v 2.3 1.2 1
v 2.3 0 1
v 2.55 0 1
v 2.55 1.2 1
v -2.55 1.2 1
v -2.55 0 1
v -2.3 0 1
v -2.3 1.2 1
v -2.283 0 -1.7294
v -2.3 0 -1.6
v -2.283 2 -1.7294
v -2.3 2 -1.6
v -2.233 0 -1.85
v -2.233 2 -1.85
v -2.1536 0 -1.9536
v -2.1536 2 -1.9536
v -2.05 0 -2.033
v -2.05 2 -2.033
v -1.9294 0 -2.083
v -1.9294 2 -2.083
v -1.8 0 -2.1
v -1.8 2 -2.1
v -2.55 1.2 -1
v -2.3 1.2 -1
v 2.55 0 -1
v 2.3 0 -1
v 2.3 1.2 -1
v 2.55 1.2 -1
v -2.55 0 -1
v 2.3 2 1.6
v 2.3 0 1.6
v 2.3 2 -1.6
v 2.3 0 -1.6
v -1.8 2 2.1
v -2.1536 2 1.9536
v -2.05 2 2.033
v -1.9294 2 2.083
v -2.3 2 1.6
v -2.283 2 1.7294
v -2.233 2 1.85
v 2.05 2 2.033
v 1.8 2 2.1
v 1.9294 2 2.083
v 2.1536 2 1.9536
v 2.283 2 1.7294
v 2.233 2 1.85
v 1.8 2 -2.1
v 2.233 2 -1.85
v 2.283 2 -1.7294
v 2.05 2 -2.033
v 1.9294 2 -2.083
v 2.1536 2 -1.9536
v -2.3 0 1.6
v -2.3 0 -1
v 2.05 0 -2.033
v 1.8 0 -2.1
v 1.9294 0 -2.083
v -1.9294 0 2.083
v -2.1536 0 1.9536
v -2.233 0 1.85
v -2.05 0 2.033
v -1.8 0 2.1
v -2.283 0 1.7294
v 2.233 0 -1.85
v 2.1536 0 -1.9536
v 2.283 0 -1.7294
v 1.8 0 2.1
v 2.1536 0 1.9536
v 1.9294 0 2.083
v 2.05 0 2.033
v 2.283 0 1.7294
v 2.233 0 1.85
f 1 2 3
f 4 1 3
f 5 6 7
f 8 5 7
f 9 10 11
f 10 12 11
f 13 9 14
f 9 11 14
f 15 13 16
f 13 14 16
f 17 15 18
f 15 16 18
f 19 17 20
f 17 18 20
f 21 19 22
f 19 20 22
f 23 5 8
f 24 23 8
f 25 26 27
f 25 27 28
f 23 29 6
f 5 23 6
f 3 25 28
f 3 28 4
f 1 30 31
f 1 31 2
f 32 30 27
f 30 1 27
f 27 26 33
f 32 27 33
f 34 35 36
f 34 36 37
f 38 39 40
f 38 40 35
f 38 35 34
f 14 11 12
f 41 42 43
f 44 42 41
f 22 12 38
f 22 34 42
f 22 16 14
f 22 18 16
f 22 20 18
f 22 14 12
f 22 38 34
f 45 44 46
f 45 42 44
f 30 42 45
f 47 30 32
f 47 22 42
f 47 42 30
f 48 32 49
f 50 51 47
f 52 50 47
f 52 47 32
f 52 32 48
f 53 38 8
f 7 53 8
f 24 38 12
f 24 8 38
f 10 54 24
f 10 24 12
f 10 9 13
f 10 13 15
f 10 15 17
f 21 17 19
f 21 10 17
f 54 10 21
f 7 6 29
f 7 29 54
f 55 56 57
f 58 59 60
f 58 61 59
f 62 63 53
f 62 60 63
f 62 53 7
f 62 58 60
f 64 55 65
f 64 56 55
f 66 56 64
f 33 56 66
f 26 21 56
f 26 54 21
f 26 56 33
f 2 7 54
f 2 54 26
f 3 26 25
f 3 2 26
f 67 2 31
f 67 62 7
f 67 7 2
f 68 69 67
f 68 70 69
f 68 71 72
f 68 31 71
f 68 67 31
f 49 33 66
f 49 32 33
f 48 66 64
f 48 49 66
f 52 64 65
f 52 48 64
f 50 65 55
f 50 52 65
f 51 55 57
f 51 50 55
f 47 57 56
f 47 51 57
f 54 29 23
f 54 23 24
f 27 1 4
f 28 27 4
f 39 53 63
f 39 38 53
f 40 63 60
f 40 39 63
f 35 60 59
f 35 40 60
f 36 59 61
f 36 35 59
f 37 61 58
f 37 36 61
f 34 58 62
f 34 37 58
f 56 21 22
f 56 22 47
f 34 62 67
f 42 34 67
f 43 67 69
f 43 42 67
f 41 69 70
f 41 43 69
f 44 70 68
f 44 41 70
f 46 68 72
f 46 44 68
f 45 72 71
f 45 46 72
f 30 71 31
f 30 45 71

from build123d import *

# Parameters (mm, degrees)
SKETCH_1_W      = 4.6
SKETCH_1_H      = 4.2
EXTRUDE_1_DEPTH = 2
FILLET_1_R      = 0.5
SKETCH_2_W      = 0.5
SKETCH_2_H      = 2
EXTRUDE_2_DEPTH = 1.2


with BuildPart() as part:
    # 草图1 → 凸台-拉伸1 (new body)
    with BuildSketch(Plane(origin=(0, 0, 0), x_dir=(1, 0, 0), z_dir=(0, 1, 0))):
        Rectangle(SKETCH_1_W, SKETCH_1_H)
    extrude(amount=EXTRUDE_1_DEPTH)

    # 圆角1
    fillet_1_edges = [part.edges().sort_by_distance(p)[0] for p in [
        (2.3, 1, 2.1),
        (-2.3, 1, 2.1),
        (-2.3, 1, -2.1),
        (2.3, 1, -2.1),
    ]]
    fillet(fillet_1_edges, radius=FILLET_1_R)

    # 草图2 → 凸台-拉伸2 (add)
    with BuildSketch(Plane.XZ):
        with Locations((-2.3, 0)):
            Rectangle(SKETCH_2_W, SKETCH_2_H)
        with Locations((2.3, 0)):
            Rectangle(SKETCH_2_W, SKETCH_2_H)
    extrude(amount=-EXTRUDE_2_DEPTH)


solid = part.part
